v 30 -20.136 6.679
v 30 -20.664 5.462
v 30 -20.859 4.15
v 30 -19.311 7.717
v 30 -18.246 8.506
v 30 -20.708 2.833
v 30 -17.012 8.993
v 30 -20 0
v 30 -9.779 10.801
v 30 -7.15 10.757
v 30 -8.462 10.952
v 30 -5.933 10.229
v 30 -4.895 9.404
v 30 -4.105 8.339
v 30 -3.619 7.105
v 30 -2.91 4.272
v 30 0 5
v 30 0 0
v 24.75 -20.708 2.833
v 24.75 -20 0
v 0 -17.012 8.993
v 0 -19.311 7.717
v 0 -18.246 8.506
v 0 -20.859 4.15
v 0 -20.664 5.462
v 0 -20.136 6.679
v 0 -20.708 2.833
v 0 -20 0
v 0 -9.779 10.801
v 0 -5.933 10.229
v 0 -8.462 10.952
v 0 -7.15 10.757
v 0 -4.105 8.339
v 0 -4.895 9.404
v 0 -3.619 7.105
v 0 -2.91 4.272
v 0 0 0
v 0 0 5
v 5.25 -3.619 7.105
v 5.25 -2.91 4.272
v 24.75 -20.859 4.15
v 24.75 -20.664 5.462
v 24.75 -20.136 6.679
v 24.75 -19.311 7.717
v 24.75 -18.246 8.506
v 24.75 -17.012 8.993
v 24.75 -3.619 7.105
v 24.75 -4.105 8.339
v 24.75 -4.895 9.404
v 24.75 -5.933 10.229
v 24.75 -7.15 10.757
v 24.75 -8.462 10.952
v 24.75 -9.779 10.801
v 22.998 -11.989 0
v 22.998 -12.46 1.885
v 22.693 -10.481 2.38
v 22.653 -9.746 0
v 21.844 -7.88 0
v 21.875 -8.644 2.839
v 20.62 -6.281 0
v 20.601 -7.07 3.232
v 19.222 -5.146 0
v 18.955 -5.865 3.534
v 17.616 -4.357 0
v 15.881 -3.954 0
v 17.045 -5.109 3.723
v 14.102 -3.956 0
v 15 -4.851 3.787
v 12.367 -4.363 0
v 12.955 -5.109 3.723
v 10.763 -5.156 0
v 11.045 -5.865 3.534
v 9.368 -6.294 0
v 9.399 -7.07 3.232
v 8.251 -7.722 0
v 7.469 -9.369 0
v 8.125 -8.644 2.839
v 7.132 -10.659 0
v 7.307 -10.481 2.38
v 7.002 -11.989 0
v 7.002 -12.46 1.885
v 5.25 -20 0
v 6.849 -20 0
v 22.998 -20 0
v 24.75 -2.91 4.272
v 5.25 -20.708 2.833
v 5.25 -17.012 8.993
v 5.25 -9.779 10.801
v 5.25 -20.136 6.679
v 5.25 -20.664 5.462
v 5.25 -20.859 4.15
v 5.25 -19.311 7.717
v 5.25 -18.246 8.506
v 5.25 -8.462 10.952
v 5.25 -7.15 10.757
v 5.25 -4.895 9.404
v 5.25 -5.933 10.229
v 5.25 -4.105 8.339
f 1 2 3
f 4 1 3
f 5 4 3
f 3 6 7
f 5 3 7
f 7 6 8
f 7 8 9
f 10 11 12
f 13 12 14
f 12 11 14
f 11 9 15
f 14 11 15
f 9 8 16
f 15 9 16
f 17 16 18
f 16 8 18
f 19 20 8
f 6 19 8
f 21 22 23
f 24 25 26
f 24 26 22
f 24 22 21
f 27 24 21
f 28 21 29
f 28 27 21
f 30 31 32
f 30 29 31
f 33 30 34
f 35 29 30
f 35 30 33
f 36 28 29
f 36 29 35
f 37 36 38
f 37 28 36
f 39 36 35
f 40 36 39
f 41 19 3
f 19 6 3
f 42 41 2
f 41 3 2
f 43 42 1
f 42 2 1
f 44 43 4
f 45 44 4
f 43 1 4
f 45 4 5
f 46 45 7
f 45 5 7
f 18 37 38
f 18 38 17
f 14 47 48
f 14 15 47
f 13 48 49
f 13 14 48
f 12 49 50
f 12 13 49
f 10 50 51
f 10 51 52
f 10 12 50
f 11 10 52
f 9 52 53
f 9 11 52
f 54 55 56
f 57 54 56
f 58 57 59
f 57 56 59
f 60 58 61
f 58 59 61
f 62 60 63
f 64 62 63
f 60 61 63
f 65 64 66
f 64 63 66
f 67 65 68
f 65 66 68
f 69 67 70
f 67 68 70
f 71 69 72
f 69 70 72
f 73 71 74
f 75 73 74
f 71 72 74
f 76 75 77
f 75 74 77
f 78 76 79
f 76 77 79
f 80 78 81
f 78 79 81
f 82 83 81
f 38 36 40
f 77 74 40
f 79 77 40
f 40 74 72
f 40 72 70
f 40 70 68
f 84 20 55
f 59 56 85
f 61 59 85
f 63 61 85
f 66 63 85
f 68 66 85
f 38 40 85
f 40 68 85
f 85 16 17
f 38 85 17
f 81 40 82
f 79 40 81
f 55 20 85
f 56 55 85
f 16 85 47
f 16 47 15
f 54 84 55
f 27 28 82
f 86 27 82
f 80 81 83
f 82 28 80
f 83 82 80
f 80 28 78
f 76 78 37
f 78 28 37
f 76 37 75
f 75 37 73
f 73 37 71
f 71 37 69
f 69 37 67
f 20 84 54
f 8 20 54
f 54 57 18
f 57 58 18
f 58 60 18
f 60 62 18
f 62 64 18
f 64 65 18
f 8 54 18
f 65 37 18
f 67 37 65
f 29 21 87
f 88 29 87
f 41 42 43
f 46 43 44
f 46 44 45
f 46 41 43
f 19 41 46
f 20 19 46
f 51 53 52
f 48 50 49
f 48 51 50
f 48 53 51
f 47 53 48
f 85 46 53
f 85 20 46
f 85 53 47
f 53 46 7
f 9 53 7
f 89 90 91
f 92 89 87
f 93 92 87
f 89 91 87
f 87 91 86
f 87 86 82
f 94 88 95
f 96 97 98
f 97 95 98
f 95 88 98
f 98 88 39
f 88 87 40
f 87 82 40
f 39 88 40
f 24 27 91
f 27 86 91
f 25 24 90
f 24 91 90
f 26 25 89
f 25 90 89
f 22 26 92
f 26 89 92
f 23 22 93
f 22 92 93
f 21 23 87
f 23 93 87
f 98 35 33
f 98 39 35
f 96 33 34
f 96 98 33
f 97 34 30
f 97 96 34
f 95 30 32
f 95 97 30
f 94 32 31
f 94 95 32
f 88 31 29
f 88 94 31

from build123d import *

# Parameters (mm, degrees)
F0_W     = 30
F0_H     = 20
F1_DEPTH = 5
F3_DEPTH = 30
F5_DEPTH = 25.4
F6_W     = 5.25
F6_H     = 17.6155281281
F7_DEPTH = 8
F8_R     = 5.08


with BuildPart() as f1:
    # F0 (on Top) → F1 (new body)
    with BuildSketch(Plane.XY):
        with Locations((15, -10)):
            Rectangle(F0_W, F0_H)
    extrude(amount=F1_DEPTH)

    # F2 (on face) → F3 (cut, through all)
    with BuildSketch(Plane.YZ.offset(30)):
        Polygon((-20, 5), (-20, 0), (0, 5), align=None)
    extrude(amount=-F3_DEPTH, mode=Mode.SUBTRACT)

    # F4 (on face) → F5 (cut)
    with BuildSketch(Plane(origin=(0, -1.1764705882, 4.7058823529), x_dir=(1, 0, 0), z_dir=(0, -0.242535625, 0.9701425001))):
        with BuildLine():
            Line((22.9984683846, -19.4028500029), (22.9984683846, -11.9438578146))
            Line((22.9984683846, -11.9438578146), (22.9984683846, -11.6307859351))
            ThreePointArc((22.9984683846, -11.6307859351), (15, -3.7873218748), (7.0015316154, -11.6307859351))
            Line((7.0015316154, -11.6307859351), (6.8494265755, -19.4028500029))
            Line((6.8494265755, -19.4028500029), (22.9984683846, -19.4028500029))
        make_face()
    extrude(amount=-F5_DEPTH, mode=Mode.SUBTRACT)

    # F6 (on face) → F7 (join)
    with BuildSketch(Plane(origin=(0, -1.1764705882, 4.7058823529), x_dir=(1, 0, 0), z_dir=(0, -0.242535625, 0.9701425001))):
        with Locations((27.375, -10.5950859389)):
            Rectangle(F6_W, F6_H)
        with Locations((2.625, -10.5950859389)):
            Rectangle(F6_W, F6_H)
    extrude(amount=F7_DEPTH)

    # F8
    f8_edges = [f1.edges().sort_by_distance(p)[0] for p in [
        (2.625, -4.850713, 12.033533),
        (27.375, -4.850713, 12.033533),
        (2.625, -21.940285, 7.76114),
        (27.375, -21.940285, 7.76114),
    ]]
    fillet(f8_edges, radius=F8_R)


solid = f1.part
